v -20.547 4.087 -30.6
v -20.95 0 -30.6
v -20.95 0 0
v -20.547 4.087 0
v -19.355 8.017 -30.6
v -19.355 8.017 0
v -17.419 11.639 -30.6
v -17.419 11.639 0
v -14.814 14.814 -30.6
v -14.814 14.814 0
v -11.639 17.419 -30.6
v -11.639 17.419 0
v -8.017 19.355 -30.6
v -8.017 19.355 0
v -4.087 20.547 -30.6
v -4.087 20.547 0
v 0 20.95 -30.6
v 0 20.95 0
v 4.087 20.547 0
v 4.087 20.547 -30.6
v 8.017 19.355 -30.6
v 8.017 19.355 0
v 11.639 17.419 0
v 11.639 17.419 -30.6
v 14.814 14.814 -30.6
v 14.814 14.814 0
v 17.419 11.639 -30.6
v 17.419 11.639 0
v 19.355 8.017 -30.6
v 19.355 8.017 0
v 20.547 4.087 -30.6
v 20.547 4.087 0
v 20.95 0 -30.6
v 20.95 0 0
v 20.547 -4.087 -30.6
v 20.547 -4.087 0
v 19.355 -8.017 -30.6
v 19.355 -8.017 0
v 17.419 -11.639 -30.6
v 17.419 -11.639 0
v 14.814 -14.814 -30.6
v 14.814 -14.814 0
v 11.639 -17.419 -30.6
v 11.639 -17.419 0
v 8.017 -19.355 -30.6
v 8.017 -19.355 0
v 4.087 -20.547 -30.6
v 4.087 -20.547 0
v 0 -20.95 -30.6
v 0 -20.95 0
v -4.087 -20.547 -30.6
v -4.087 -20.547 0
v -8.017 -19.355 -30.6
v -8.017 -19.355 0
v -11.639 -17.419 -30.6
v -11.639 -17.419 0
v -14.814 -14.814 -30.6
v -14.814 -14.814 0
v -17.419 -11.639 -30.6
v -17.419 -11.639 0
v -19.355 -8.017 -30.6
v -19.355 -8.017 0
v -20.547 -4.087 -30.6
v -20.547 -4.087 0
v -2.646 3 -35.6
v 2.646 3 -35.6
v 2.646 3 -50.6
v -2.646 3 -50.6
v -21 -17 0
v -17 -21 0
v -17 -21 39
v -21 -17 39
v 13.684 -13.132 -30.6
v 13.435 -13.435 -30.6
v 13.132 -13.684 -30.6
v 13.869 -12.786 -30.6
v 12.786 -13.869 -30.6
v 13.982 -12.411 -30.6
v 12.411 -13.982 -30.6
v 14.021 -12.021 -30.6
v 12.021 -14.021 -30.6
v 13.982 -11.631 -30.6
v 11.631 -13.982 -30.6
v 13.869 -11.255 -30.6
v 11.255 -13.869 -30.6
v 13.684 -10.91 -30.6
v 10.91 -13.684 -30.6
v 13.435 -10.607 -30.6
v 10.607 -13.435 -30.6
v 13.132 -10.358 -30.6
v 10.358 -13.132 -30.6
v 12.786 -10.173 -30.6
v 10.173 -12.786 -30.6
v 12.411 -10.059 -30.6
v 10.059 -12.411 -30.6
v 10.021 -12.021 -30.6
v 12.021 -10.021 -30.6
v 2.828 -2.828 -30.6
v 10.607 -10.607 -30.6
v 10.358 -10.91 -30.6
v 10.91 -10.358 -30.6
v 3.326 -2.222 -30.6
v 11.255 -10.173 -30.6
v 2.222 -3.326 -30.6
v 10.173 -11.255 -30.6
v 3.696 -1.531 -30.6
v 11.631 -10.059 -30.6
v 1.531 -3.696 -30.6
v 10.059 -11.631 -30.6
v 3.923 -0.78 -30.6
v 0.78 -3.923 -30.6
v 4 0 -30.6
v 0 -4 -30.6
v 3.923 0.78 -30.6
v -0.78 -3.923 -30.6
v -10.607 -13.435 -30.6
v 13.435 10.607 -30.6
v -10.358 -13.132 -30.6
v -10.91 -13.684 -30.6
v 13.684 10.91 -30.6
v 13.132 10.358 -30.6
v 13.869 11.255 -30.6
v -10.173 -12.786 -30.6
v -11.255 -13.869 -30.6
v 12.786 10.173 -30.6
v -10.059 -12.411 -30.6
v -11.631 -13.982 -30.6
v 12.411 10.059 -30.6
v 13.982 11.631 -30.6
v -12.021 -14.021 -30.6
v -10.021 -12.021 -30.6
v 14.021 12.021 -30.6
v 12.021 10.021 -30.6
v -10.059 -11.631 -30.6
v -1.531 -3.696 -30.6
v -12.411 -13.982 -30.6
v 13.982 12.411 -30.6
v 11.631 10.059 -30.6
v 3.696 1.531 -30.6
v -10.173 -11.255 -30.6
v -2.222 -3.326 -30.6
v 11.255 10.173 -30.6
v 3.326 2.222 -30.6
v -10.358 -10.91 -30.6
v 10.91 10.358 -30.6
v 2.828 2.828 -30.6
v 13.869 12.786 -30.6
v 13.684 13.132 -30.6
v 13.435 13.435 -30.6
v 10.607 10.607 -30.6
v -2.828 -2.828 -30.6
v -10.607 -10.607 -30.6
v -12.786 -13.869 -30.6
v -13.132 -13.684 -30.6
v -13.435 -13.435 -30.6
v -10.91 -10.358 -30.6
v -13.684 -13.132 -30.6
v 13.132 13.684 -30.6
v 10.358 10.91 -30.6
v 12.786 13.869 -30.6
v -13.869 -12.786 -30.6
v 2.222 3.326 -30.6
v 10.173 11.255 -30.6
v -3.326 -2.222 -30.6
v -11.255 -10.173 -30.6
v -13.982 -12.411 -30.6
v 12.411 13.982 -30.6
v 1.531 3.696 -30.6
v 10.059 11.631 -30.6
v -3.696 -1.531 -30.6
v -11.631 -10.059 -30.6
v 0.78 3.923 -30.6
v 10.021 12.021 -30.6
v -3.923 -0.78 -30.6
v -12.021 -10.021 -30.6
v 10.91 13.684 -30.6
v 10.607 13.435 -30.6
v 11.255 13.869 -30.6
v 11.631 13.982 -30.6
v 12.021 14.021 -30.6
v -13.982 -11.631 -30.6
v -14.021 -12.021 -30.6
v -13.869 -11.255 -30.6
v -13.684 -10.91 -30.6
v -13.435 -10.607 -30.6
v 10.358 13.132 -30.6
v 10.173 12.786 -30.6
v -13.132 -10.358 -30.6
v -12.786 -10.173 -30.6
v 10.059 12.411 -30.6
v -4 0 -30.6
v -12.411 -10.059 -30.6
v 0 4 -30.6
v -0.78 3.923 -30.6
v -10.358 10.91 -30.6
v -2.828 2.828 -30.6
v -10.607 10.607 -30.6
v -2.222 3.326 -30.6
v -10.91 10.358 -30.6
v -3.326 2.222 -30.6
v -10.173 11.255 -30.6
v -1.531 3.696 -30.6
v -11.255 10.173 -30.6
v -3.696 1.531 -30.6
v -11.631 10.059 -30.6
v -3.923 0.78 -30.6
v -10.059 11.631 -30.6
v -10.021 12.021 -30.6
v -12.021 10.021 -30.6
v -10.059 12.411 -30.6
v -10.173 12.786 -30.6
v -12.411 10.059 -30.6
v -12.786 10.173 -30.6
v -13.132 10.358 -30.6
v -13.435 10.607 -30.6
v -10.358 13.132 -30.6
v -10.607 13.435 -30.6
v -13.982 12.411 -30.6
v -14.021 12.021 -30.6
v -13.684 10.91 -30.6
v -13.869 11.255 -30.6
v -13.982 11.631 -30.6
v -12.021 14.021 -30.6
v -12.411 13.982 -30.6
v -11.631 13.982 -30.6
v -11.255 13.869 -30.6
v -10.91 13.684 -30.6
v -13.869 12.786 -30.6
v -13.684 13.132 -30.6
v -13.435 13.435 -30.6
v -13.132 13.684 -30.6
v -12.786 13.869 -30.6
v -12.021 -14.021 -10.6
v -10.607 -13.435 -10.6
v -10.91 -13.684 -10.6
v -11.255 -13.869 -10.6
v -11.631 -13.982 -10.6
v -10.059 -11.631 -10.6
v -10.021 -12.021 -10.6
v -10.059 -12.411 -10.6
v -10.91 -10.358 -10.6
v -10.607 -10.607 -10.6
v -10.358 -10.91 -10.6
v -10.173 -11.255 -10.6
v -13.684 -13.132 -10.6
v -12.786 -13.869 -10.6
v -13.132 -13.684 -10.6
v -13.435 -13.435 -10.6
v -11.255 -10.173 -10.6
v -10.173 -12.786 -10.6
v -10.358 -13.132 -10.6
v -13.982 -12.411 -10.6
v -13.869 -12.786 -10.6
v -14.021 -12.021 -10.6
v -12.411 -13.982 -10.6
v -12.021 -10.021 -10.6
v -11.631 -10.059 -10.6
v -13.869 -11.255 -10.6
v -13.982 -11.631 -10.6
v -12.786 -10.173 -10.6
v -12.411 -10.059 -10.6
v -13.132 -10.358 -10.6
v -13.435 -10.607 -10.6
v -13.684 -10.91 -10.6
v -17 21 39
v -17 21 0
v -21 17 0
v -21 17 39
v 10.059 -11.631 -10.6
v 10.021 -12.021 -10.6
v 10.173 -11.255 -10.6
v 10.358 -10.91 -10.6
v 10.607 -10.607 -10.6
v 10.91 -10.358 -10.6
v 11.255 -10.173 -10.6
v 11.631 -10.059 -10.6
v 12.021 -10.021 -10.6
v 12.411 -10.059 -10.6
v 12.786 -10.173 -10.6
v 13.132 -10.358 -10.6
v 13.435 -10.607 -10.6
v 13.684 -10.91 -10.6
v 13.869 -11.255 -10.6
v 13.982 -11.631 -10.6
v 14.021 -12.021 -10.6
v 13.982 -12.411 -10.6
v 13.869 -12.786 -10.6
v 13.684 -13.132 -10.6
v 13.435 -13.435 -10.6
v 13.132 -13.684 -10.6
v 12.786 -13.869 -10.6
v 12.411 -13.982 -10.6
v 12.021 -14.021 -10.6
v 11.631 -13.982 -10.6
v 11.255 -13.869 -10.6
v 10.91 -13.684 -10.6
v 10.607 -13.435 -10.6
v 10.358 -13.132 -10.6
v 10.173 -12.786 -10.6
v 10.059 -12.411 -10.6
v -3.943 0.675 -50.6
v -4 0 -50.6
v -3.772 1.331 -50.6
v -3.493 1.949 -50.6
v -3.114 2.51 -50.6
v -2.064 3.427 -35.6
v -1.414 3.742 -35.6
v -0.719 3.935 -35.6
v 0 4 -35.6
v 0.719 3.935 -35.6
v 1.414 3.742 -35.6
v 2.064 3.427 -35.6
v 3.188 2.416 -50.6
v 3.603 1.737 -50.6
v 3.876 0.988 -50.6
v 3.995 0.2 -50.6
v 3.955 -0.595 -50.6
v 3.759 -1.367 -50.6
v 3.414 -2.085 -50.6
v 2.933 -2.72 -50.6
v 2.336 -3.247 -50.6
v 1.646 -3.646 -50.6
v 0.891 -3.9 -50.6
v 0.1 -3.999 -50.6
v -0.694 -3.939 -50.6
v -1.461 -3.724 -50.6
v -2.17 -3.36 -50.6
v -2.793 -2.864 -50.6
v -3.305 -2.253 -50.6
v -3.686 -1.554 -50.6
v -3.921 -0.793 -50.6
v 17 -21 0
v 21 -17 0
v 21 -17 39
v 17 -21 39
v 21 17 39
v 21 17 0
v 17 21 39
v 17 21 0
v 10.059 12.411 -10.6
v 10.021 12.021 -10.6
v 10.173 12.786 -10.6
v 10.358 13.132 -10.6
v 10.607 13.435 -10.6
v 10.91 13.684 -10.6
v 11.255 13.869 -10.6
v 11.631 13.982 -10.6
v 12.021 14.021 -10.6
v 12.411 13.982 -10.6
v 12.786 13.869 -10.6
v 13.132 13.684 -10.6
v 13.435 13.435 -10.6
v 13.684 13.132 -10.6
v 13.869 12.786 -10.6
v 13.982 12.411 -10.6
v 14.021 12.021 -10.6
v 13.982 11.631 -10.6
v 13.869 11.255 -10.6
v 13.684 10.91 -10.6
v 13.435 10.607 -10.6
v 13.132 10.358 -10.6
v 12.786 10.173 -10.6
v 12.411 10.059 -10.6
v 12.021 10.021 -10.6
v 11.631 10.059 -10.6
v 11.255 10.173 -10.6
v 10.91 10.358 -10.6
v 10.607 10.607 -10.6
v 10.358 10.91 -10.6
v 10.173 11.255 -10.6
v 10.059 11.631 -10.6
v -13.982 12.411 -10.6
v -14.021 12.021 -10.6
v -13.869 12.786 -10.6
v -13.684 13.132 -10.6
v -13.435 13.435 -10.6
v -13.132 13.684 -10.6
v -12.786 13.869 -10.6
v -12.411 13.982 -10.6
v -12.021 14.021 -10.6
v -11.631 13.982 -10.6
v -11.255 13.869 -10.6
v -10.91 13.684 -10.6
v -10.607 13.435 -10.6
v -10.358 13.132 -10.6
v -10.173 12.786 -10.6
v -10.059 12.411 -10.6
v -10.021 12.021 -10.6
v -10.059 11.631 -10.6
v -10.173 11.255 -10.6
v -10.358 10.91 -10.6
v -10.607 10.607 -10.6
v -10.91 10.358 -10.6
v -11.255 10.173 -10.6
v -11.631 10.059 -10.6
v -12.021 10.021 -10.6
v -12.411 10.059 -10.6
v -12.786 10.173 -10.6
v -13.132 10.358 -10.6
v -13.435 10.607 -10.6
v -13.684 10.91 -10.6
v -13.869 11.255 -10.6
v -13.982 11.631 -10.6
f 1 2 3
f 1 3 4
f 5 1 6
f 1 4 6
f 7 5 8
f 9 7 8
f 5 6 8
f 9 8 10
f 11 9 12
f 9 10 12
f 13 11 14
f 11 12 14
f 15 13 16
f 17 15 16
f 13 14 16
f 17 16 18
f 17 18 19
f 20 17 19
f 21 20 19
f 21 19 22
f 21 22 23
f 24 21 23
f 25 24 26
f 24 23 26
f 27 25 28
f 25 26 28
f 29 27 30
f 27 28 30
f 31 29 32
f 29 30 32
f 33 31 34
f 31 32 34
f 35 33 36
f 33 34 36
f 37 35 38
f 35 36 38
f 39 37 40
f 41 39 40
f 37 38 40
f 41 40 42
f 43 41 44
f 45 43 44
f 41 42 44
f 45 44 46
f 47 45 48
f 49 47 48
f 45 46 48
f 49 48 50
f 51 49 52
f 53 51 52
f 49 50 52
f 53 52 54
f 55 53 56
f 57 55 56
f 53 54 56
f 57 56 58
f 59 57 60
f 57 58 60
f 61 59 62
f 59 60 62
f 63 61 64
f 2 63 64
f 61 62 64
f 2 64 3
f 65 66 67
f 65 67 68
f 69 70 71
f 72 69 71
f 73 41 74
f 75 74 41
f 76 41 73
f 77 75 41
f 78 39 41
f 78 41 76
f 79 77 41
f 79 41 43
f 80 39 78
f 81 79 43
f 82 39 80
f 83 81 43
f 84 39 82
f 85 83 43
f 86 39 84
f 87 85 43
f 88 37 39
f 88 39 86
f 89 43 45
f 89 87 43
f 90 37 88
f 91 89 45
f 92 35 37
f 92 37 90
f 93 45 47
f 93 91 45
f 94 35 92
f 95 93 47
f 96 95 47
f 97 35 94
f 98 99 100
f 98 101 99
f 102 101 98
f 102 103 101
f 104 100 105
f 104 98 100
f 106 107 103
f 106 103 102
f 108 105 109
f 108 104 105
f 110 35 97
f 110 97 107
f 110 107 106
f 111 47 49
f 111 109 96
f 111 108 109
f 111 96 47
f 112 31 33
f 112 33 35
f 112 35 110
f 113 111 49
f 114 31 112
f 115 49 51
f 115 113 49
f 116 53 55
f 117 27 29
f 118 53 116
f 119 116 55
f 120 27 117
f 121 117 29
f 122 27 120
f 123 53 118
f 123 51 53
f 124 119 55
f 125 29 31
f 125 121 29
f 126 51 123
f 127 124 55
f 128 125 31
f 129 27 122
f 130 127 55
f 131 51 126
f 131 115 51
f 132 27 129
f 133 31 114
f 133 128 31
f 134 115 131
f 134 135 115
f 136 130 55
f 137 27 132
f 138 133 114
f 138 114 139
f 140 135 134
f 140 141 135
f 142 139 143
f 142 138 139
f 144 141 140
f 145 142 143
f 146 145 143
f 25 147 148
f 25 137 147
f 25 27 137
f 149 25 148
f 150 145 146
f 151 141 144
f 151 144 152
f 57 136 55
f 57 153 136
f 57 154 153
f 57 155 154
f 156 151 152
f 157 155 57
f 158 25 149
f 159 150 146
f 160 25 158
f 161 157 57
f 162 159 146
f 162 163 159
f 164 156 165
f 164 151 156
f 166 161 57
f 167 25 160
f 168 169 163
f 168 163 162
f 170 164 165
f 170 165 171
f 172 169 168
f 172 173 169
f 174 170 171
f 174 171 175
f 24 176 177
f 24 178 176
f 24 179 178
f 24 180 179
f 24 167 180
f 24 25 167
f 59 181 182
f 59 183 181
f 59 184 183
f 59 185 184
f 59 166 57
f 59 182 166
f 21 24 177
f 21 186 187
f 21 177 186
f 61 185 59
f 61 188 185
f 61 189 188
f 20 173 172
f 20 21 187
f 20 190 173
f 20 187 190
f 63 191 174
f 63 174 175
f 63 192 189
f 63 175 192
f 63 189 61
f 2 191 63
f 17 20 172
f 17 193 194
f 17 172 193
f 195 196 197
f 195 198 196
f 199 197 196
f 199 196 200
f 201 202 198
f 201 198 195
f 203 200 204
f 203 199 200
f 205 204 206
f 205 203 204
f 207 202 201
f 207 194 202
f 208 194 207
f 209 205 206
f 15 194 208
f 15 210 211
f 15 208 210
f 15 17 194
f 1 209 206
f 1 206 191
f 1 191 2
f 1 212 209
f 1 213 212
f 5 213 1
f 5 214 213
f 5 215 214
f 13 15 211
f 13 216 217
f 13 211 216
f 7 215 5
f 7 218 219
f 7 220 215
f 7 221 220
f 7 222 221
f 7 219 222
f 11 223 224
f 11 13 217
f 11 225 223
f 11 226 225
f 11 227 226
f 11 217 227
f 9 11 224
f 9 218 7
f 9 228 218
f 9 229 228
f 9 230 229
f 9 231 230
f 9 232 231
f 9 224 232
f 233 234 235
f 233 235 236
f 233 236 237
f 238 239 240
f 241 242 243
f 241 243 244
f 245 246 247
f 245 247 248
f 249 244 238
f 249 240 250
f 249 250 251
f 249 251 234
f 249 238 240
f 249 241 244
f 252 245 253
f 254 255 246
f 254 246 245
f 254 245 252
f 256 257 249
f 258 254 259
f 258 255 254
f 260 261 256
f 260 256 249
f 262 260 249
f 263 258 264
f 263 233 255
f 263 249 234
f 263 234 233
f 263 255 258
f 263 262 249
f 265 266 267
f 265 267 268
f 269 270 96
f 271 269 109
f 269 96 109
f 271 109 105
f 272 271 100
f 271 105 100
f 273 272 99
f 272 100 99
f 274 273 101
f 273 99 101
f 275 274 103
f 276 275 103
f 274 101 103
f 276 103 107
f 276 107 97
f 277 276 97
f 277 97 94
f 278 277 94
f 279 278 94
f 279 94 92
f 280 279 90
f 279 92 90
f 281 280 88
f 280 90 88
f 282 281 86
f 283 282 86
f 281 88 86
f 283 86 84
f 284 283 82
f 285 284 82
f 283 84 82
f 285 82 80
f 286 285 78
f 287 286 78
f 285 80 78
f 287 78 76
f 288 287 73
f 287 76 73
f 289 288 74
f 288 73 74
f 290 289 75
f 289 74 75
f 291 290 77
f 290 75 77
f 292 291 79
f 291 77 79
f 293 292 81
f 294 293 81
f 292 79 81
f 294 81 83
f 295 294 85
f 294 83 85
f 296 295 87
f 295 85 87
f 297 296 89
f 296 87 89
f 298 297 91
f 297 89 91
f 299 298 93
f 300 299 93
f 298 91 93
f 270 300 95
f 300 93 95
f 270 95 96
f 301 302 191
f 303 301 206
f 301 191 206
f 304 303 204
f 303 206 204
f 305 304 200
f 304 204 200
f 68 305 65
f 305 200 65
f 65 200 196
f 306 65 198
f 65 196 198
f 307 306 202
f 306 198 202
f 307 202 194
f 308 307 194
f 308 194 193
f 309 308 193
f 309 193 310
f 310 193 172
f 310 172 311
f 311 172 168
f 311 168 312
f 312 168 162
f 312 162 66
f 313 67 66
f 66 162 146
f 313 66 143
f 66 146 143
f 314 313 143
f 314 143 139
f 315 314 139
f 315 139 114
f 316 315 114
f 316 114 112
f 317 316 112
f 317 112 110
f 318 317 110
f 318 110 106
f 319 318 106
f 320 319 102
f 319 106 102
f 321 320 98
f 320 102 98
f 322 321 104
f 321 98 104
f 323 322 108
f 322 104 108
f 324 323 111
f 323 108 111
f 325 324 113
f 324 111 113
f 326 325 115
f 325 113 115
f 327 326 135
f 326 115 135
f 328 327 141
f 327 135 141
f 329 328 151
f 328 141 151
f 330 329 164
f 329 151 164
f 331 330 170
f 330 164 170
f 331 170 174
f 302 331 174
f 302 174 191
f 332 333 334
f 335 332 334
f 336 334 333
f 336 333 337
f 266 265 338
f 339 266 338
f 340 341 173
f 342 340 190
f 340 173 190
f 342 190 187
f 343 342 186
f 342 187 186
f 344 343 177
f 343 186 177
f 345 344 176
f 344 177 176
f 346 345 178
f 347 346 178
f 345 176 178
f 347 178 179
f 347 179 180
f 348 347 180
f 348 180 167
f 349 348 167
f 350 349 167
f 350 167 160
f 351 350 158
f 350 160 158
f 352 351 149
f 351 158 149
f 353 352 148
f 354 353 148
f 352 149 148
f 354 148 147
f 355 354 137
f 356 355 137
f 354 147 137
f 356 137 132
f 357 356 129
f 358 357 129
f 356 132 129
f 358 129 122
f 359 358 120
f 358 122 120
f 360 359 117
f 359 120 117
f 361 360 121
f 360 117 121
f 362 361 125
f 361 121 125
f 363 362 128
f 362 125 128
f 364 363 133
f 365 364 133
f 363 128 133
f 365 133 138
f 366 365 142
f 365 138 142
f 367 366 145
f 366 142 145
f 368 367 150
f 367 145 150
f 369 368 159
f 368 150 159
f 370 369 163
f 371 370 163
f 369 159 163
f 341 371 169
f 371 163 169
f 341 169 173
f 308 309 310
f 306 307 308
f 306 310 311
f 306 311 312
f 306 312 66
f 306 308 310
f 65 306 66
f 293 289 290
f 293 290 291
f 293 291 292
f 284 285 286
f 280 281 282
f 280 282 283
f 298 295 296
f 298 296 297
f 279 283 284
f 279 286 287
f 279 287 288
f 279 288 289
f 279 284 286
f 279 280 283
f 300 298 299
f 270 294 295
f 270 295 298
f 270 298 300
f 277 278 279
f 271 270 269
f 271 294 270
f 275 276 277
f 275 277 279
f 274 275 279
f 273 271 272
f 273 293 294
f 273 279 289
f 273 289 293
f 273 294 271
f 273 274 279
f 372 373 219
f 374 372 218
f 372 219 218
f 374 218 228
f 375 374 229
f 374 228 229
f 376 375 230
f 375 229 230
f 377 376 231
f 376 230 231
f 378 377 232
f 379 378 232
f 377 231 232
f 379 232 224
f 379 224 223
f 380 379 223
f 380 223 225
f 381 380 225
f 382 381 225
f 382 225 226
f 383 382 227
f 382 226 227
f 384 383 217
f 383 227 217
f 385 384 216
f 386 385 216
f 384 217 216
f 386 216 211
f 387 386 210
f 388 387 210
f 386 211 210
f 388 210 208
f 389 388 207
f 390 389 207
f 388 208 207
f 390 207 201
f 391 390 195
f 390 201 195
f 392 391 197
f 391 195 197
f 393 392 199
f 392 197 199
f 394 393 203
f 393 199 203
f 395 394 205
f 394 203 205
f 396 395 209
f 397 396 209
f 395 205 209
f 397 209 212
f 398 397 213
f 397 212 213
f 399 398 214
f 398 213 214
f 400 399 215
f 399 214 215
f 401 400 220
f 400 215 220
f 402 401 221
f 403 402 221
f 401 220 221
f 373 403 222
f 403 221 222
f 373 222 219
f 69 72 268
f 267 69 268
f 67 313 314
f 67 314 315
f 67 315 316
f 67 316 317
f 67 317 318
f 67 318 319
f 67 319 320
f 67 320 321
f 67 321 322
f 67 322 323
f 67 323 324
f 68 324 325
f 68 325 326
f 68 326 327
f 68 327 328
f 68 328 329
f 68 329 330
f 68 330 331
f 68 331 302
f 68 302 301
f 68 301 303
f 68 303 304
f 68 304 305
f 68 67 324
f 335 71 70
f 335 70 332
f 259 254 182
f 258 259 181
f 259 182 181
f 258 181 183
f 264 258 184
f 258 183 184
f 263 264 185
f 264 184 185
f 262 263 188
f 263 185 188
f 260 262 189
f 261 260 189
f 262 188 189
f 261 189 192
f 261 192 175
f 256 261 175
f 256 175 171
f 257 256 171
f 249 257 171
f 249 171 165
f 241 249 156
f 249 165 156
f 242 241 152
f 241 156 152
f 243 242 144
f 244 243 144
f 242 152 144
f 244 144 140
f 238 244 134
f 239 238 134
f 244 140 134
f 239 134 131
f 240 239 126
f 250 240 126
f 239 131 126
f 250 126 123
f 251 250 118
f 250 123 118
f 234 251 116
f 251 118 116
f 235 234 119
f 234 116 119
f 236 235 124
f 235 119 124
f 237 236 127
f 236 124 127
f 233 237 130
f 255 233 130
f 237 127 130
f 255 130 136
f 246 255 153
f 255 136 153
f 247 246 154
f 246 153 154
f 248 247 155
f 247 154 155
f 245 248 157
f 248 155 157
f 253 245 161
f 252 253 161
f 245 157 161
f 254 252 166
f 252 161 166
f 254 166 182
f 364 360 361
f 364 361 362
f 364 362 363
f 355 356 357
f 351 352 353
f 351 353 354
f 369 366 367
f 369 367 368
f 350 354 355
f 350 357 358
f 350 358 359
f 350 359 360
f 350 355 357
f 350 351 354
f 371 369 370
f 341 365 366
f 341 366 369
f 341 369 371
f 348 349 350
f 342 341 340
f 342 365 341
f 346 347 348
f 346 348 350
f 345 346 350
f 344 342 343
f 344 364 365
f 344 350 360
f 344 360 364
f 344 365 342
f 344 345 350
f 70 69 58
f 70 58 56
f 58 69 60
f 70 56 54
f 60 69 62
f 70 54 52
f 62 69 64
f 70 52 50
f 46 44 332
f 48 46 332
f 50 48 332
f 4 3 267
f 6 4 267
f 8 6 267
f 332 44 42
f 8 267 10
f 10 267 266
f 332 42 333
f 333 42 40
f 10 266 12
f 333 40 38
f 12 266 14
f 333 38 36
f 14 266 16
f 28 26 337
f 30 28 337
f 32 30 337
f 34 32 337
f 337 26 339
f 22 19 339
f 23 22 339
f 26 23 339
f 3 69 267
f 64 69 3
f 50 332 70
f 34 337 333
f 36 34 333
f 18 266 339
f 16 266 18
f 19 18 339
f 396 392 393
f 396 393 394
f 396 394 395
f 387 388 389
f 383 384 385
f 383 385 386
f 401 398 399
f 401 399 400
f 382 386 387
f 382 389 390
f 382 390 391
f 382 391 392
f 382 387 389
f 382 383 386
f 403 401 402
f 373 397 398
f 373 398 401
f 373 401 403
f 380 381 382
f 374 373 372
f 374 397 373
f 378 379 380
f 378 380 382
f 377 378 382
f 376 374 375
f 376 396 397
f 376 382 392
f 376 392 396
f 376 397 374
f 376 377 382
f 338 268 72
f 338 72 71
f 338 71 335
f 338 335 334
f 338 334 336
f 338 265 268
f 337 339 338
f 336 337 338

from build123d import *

# Parameters (mm, degrees)
SKETCH1_W           = 42
SKETCH1_H           = 42
BOSS_EXTRUDE1_DEPTH = 39
CHAMFER1_SIZE       = 4
SKETCH2_R           = 20.95
BOSS_EXTRUDE2_DEPTH = 30.6
SKETCH3_R           = 4
BOSS_EXTRUDE3_DEPTH = 20
CUT_EXTRUDE1_START  = -15
CUT_EXTRUDE1_DEPTH  = 15
SKETCH5_R           = 2
CUT_EXTRUDE2_DEPTH  = 20


with BuildPart() as part:
    # Sketch1 → Boss-Extrude1 (new body)
    with BuildSketch(Plane.XY):
        Rectangle(SKETCH1_W, SKETCH1_H)
    extrude(amount=BOSS_EXTRUDE1_DEPTH)

    # Chamfer1
    chamfer1_edges = [part.edges().sort_by_distance(p)[0] for p in [
        (21, -21, 19.5),
        (-21, -21, 19.5),
        (-21, 21, 19.5),
        (21, 21, 19.5),
    ]]
    chamfer(chamfer1_edges, length=CHAMFER1_SIZE)

    # Sketch2 → Boss-Extrude2 (add)
    with BuildSketch(Plane(origin=(0, 0, 0), x_dir=(-1, 0, 0), z_dir=(0, 0, -1))):
        Circle(SKETCH2_R)
    extrude(amount=BOSS_EXTRUDE2_DEPTH)

    # Sketch3 → Boss-Extrude3 (add)
    with BuildSketch(Plane(origin=(0, 0, -30.6), x_dir=(-1, 0, 0), z_dir=(0, 0, -1))):
        Circle(SKETCH3_R)
    extrude(amount=BOSS_EXTRUDE3_DEPTH)

    # Sketch4 → Cut-Extrude1 (cut)
    with BuildSketch(Plane(origin=(0, 0, -50.6), x_dir=(-1, 0, 0), z_dir=(0, 0, -1)).offset(CUT_EXTRUDE1_START)):
        with BuildLine():
            Line((-2.645751311, 3), (2.645751311, 3))
            ThreePointArc((2.645751311, 3), (0, 4), (-2.645751311, 3))
        make_face()
    extrude(amount=CUT_EXTRUDE1_DEPTH, mode=Mode.SUBTRACT)

    # Sketch5 → Cut-Extrude2 (cut)
    with BuildSketch(Plane(origin=(0, 0, -30.6), x_dir=(-1, 0, 0), z_dir=(0, 0, -1))):
        with Locations((12.02081528, 12.02081528)):
            Circle(SKETCH5_R)
        with Locations((12.02081528, -12.02081528)):
            Circle(SKETCH5_R)
        with Locations((-12.02081528, -12.02081528)):
            Circle(SKETCH5_R)
        with Locations((-12.02081528, 12.02081528)):
            Circle(SKETCH5_R)
    extrude(amount=-CUT_EXTRUDE2_DEPTH, mode=Mode.SUBTRACT)


solid = part.part
